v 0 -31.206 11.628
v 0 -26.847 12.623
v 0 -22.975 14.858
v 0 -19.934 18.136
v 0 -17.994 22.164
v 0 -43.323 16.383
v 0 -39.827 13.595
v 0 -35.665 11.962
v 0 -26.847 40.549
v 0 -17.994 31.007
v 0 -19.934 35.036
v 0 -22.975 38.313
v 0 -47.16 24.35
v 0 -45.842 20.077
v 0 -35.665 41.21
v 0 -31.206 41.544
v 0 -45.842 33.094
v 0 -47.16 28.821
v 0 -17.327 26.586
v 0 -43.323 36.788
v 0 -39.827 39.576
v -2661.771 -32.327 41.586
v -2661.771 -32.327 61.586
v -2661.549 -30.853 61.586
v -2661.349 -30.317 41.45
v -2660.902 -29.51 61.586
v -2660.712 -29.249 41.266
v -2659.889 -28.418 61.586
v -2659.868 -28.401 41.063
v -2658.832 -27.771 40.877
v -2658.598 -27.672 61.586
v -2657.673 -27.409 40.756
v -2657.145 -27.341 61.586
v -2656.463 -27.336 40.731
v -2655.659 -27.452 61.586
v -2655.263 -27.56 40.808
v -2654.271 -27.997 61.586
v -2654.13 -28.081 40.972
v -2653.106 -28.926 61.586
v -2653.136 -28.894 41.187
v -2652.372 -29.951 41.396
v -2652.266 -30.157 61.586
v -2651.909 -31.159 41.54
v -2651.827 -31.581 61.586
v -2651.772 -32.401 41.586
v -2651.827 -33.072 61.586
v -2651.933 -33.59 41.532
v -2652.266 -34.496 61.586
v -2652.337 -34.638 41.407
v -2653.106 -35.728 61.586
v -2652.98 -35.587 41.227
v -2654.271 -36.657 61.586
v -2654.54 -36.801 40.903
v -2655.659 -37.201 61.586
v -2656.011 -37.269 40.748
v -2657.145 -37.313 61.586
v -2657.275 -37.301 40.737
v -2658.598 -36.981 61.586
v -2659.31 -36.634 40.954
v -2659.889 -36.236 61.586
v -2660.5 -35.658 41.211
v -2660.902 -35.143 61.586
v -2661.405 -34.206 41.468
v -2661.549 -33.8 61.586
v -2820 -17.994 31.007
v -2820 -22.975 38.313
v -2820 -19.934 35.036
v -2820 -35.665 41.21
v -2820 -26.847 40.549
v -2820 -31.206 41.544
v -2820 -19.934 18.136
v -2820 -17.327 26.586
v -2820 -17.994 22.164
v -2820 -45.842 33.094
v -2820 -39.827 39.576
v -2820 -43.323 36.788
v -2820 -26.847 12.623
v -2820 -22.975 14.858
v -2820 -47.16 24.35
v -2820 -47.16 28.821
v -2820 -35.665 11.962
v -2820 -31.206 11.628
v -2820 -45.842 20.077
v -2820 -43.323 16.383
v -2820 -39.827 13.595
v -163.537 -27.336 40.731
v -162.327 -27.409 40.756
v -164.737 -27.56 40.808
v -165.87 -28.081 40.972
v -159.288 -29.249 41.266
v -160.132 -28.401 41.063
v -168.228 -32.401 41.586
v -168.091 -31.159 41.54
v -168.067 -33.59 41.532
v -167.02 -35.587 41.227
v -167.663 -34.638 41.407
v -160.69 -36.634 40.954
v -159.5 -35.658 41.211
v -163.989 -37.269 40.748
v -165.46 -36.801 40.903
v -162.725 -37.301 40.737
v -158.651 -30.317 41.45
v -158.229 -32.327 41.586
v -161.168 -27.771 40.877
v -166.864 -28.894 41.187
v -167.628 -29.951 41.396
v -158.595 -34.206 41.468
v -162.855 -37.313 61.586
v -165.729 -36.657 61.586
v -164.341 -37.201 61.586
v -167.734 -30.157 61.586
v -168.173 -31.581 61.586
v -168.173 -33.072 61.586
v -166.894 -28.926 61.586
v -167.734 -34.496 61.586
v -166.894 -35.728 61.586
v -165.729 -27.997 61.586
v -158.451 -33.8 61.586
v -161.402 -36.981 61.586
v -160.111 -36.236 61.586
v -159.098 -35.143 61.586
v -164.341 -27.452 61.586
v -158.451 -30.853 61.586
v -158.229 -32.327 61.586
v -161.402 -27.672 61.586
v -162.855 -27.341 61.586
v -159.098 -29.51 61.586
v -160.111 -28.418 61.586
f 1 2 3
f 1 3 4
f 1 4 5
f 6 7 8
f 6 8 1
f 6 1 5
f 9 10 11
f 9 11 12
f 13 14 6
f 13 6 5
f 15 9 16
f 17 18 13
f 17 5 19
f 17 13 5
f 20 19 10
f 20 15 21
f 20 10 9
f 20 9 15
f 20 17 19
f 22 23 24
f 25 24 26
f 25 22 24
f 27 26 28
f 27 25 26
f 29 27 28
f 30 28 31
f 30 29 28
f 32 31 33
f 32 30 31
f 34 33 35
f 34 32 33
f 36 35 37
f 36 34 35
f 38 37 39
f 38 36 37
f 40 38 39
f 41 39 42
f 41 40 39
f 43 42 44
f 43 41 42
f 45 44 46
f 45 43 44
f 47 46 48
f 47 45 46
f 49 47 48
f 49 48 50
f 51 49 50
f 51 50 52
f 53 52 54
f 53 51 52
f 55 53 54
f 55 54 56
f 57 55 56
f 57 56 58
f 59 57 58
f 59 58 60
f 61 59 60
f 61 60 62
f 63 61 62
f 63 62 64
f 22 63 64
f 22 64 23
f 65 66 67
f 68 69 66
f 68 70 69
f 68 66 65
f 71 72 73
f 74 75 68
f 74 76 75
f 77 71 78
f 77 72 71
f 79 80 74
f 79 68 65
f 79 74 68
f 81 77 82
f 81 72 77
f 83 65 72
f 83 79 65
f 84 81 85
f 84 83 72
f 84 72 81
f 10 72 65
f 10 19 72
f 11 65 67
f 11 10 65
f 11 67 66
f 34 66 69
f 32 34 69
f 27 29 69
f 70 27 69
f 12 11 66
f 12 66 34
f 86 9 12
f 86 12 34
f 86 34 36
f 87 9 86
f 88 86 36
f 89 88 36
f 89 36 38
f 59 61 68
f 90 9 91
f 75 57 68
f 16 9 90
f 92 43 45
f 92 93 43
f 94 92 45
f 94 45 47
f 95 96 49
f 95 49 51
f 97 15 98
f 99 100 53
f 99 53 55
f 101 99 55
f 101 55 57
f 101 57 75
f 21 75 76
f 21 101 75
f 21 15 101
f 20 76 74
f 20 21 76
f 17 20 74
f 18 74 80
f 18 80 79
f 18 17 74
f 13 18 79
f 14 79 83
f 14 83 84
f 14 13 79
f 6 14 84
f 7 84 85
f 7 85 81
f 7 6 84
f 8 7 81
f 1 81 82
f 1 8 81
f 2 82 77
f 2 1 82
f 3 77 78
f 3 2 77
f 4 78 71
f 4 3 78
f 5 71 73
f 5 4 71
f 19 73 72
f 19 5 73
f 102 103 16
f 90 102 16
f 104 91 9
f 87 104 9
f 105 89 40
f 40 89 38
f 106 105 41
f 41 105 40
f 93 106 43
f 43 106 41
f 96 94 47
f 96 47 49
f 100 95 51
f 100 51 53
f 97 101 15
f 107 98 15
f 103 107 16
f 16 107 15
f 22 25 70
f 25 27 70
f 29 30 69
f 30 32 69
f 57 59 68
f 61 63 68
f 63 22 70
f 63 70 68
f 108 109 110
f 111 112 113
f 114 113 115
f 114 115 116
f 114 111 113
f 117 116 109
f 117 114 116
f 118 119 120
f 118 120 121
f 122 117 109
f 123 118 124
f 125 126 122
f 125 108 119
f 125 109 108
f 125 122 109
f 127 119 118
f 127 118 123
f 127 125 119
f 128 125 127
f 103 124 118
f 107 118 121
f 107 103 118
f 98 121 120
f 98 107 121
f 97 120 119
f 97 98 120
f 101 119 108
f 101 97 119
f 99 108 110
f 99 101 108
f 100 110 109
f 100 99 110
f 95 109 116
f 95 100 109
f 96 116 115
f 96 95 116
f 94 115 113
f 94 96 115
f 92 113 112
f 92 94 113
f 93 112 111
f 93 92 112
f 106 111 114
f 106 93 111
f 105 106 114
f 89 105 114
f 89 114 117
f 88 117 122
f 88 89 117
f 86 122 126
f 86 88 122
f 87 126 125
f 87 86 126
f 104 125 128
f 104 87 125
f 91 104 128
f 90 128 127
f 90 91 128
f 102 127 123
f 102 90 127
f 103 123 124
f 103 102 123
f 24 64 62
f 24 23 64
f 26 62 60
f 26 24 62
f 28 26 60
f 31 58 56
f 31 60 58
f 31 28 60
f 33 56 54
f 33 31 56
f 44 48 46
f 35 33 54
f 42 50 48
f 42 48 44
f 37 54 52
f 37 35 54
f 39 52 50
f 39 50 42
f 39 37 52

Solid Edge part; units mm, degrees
sketch "Sketch1" plane through (0, 0, 0) normal (1, 0, 0) x (0, 1, 0)
  circle A0 centre (-32.3272, 26.5857) radius 15
  dimension "D1" = 30
extrude "Protrusion1" add sketch "Sketch1" against normal blind 1410
revolve "RevolvedProtrusion1" [suppressed]
sketch "Sketch2" plane through (0, 0, 26.5855) normal (0, 0, 1) x (1, 0, 0)
  circle A0 centre (-163.2288, -32.3267) radius 5
extrude "ExtrudedProtrusion_5" add sketch "Sketch2" along normal blind 35
mirror "Mirror1" about plane through (-1410, -32.3272, 26.5857) normal (-1, 0, 0) of "Protrusion1", "ExtrudedProtrusion_5"
